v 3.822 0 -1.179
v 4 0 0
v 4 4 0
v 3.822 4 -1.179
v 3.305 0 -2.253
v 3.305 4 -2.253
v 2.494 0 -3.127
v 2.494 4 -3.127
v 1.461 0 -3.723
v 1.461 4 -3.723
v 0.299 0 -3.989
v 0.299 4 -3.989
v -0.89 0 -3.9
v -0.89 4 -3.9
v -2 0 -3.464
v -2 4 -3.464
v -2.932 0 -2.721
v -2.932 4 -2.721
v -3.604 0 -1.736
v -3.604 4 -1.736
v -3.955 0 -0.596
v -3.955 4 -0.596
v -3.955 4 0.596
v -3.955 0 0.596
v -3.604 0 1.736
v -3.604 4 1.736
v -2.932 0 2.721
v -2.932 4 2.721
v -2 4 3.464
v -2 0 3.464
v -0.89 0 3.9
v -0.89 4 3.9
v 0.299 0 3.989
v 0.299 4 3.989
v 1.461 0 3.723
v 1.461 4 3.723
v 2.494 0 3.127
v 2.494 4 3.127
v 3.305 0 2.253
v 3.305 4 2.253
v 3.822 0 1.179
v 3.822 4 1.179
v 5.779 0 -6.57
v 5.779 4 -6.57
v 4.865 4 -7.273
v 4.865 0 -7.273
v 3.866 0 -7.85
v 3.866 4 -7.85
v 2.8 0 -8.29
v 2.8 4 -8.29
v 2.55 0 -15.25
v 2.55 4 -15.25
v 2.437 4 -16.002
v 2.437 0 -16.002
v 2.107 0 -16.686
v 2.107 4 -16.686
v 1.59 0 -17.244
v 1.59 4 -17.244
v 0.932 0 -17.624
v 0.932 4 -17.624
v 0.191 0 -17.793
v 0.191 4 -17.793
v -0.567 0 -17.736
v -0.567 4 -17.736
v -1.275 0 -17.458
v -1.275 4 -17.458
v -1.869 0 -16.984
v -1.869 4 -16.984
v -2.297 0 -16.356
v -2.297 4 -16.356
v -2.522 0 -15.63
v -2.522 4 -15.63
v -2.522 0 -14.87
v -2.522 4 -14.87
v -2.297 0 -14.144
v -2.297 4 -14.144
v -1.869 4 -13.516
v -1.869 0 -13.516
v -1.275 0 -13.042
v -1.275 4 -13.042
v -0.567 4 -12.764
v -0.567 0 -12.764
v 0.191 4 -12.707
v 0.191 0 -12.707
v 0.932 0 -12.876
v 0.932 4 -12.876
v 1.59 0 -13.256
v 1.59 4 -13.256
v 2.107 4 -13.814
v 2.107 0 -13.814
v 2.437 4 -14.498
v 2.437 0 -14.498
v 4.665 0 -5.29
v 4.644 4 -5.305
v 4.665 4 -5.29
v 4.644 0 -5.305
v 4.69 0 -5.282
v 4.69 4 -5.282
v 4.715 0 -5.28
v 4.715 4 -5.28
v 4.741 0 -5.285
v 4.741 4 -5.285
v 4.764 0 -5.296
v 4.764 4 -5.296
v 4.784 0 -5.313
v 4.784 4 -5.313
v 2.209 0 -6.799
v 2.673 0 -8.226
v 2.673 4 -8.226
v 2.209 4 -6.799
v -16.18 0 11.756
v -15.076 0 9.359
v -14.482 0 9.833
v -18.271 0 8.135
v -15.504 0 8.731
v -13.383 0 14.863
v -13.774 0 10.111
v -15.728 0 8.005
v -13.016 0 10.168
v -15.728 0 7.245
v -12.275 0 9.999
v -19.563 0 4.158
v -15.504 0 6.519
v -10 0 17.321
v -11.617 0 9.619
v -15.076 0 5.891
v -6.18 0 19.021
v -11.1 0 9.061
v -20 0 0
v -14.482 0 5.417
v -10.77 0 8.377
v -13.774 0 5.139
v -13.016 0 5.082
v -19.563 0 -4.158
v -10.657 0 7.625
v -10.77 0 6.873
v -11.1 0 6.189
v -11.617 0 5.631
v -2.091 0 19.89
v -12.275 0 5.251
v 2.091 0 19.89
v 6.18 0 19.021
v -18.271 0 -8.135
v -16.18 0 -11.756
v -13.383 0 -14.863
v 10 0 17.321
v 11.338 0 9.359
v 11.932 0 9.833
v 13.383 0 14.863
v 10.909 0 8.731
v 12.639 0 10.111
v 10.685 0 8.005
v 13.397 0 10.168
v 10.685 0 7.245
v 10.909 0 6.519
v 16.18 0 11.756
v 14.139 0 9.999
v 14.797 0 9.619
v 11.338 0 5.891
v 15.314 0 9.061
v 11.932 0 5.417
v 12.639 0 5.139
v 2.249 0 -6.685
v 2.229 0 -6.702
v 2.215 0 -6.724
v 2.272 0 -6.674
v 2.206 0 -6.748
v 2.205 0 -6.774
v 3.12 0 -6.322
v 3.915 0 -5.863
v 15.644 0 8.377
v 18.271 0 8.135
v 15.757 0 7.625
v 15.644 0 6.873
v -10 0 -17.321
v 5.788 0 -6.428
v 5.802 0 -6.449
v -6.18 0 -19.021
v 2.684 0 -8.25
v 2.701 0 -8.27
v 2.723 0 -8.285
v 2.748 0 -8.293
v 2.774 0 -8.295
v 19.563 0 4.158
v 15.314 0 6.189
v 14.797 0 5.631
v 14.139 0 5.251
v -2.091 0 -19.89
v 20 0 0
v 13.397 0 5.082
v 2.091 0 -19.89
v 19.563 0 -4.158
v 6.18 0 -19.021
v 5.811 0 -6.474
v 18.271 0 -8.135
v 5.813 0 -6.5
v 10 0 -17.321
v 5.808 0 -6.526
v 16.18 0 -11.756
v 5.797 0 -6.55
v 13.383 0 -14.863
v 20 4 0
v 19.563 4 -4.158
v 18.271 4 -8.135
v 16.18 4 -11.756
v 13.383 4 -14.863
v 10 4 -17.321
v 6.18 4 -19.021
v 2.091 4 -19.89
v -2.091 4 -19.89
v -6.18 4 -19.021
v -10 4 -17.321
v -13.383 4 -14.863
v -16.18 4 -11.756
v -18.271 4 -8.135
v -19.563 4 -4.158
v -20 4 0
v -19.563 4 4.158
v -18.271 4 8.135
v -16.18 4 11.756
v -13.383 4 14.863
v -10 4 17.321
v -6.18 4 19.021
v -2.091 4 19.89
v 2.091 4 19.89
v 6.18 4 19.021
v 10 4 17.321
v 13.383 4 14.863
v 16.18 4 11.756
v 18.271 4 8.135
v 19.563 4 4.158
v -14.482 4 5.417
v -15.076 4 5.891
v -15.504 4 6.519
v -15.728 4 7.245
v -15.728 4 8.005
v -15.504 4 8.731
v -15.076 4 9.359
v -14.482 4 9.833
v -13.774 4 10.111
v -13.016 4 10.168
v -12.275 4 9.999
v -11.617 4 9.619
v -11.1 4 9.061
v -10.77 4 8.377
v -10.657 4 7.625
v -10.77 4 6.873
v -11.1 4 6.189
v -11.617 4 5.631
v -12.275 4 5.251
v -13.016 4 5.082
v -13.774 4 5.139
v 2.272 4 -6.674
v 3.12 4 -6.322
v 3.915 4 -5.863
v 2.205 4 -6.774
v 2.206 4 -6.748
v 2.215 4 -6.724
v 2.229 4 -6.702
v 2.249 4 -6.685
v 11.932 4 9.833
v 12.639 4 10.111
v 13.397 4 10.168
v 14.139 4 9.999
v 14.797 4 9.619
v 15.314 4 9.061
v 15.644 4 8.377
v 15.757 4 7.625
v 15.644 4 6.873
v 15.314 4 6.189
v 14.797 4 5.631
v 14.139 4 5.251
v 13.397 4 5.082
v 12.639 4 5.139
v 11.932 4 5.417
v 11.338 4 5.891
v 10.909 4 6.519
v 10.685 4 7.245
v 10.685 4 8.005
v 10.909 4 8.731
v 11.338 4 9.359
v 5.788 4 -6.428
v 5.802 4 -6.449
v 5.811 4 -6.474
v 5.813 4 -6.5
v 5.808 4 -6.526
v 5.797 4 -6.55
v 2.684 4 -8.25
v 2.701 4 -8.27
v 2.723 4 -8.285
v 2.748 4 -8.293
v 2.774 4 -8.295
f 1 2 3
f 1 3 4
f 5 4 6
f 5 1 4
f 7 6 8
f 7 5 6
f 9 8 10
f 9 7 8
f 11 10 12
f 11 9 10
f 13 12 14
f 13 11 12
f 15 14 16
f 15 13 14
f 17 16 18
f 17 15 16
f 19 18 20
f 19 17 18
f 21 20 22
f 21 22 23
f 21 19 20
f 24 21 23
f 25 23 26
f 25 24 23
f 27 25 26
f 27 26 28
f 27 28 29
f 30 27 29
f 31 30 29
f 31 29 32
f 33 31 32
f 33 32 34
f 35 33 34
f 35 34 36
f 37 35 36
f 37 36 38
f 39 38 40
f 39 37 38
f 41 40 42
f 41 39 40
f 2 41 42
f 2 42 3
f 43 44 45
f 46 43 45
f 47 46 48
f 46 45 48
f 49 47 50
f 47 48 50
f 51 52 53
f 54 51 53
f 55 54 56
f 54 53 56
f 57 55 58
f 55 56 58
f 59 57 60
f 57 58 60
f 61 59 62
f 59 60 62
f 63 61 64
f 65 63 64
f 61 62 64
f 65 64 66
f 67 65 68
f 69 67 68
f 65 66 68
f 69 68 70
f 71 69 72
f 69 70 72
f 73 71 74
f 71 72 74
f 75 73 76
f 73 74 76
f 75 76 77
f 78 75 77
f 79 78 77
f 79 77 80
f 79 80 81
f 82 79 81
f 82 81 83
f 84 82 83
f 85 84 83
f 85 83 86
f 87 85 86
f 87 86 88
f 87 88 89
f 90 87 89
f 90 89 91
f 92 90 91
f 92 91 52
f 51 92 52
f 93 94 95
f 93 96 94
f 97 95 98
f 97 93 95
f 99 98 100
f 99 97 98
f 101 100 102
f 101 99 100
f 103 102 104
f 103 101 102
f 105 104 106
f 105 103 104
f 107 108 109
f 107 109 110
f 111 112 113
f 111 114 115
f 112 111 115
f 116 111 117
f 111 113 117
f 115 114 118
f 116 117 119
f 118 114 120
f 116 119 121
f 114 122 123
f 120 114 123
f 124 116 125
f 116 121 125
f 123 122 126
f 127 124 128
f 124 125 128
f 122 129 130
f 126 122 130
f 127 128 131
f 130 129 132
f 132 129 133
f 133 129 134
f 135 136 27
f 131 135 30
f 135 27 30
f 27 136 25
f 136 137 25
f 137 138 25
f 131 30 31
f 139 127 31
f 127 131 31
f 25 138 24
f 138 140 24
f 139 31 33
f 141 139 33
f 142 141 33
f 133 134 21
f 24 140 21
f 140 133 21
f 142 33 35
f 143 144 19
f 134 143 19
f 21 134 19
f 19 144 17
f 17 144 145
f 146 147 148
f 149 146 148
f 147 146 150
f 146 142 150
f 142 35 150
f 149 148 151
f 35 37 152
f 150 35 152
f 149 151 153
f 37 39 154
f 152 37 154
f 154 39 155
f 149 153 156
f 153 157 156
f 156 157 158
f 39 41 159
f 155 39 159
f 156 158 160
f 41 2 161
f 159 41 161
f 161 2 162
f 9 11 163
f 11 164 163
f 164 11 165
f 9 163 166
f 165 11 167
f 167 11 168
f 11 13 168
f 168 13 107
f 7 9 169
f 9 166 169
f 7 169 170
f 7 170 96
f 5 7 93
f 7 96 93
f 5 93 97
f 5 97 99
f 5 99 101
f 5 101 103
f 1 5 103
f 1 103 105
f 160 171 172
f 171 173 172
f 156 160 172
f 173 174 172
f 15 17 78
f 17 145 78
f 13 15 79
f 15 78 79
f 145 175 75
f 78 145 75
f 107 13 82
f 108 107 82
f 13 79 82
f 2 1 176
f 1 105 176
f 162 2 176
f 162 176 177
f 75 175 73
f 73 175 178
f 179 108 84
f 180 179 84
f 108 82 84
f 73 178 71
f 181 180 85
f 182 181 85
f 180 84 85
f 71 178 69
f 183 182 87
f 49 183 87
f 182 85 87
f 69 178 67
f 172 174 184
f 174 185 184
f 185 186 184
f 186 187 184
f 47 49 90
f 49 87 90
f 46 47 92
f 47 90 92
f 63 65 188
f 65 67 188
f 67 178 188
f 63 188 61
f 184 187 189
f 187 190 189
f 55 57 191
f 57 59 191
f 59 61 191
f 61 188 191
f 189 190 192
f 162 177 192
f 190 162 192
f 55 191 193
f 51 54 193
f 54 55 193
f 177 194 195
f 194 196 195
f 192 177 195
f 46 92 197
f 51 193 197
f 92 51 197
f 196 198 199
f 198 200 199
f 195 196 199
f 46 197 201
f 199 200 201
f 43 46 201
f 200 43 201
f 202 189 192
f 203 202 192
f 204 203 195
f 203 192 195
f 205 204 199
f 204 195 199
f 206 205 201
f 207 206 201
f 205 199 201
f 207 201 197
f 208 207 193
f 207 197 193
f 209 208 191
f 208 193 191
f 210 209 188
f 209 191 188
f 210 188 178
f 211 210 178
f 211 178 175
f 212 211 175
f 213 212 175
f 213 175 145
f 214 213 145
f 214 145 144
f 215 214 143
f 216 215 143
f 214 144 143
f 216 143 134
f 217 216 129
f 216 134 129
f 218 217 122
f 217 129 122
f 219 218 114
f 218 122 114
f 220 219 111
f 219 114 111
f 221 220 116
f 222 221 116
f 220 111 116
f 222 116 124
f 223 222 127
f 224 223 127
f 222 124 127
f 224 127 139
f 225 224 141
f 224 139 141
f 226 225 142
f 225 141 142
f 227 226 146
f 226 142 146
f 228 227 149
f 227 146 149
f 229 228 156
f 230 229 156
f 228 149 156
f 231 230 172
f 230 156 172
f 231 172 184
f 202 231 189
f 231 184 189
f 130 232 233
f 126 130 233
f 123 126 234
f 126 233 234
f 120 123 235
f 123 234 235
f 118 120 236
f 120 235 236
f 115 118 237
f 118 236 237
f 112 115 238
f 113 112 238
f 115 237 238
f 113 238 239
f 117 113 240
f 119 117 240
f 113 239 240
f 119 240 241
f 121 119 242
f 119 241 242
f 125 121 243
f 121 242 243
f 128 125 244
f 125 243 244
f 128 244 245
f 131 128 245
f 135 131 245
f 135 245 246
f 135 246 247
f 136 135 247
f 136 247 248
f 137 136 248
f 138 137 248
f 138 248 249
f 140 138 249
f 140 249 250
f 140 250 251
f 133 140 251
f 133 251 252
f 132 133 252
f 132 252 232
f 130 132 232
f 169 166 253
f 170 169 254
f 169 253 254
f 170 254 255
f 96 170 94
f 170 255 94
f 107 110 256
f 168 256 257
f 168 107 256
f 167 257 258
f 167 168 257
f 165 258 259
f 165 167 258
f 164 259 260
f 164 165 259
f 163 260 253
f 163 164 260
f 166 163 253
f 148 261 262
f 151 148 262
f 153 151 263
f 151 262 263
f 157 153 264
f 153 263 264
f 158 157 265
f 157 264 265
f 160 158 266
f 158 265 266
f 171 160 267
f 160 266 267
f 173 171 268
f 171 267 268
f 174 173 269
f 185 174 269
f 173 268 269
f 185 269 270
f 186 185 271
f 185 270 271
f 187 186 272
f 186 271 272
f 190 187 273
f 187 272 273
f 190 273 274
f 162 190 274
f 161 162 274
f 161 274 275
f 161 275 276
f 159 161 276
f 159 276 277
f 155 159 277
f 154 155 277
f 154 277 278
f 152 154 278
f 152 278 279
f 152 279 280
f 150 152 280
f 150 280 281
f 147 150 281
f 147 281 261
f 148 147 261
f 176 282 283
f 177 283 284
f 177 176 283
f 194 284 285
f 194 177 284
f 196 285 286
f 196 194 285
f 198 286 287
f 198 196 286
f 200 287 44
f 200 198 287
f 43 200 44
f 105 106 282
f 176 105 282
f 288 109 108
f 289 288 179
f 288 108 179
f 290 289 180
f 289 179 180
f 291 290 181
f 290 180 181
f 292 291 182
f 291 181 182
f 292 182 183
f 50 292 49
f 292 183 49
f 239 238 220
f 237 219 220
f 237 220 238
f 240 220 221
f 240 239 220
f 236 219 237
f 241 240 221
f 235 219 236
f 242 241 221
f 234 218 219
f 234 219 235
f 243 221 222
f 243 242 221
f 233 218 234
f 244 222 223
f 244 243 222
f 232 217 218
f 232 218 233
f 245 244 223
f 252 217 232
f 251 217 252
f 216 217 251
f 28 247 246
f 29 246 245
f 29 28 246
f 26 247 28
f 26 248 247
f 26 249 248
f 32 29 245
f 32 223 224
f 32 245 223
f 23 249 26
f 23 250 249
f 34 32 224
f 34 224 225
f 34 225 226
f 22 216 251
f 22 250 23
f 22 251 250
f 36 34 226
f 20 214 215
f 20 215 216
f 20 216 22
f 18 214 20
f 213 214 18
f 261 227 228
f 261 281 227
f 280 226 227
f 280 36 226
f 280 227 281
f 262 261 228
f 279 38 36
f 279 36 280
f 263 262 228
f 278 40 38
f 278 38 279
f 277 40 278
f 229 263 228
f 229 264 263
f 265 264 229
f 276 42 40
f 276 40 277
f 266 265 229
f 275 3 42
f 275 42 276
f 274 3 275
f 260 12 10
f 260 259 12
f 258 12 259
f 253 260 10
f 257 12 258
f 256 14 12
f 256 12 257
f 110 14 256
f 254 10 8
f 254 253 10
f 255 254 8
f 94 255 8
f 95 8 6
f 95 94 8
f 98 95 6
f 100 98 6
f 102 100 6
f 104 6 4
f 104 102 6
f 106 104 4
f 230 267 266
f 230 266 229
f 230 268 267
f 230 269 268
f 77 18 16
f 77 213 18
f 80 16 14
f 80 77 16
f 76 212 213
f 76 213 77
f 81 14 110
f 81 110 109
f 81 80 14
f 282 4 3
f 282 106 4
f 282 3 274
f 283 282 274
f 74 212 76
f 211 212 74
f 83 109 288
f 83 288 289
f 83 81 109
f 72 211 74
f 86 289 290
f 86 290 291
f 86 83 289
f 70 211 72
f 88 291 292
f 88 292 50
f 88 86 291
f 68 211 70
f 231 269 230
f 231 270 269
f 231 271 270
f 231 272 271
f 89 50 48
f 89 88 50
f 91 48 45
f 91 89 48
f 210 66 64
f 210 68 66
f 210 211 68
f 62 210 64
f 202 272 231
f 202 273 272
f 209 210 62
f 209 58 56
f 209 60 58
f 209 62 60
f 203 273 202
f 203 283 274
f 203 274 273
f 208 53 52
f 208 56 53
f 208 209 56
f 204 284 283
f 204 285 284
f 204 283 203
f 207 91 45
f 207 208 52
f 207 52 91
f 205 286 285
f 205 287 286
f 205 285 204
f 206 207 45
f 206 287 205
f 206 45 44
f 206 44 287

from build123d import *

# Parameters (mm, degrees)
SKETCH1_R           = 20
SKETCH1_R_2         = 4
BOSS_EXTRUDE1_DEPTH = 4
SKETCH2_R           = 2.55
CUT_EXTRUDE2_DEPTH  = 5
CIRPATTERN1_COUNT   = 3
CUT_EXTRUDE3_DEPTH  = 5
FILLET1_R           = 0.1


with BuildPart() as part:
    # Sketch1 → Boss-Extrude1 (new body)
    with BuildSketch(Plane(origin=(0, 0, 0), x_dir=(1, 0, 0), z_dir=(0, 1, 0))):
        Circle(SKETCH1_R)
        Circle(SKETCH1_R_2, mode=Mode.SUBTRACT)
    extrude(amount=BOSS_EXTRUDE1_DEPTH)

    # Sketch2 → Cut-Extrude2 (cut, through all)
    with BuildSketch(Plane(origin=(0, 4, 0), x_dir=(1, 0, 0), z_dir=(0, 1, 0))):
        with Locations((0, 15.25)):
            Circle(SKETCH2_R)
    cut_extrude2 = extrude(amount=-CUT_EXTRUDE2_DEPTH, mode=Mode.SUBTRACT)

    # CirPattern1: Cut-Extrude2 ×3 about axis
    cirpattern1_axis = Axis((0, 0, 0), (0, 1, 0))
    for i in range(1, CIRPATTERN1_COUNT):
        add(cut_extrude2.rotate(cirpattern1_axis, i * 360 / CIRPATTERN1_COUNT), mode=Mode.SUBTRACT)

    # Sketch3 → Cut-Extrude3 (cut, through all)
    with BuildSketch(Plane(origin=(0, 4, 0), x_dir=(1, 0, 0), z_dir=(0, 1, 0))):
        with BuildLine():
            Line((2.703898701, 8.321744518), (2.17856981, 6.70494844))
            ThreePointArc((2.17856981, 6.70494844), (3.525, 6.105479097), (4.717370775, 5.23917102))
            Line((4.717370775, 5.23917102), (5.854892806, 6.502517223))
            ThreePointArc((5.854892806, 6.502517223), (4.375, 7.577722283), (2.703898701, 8.321744518))
        make_face()
    extrude(amount=-CUT_EXTRUDE3_DEPTH, mode=Mode.SUBTRACT)

    # Fillet1
    fillet1_edges = [part.edges().sort_by_distance(p)[0] for p in [
        (2.703898701, 2, -8.321744518),
        (5.854892806, 2, -6.502517223),
        (4.717370775, 2, -5.23917102),
        (2.17856981, 2, -6.70494844),
    ]]
    fillet(fillet1_edges, radius=FILLET1_R)


solid = part.part
